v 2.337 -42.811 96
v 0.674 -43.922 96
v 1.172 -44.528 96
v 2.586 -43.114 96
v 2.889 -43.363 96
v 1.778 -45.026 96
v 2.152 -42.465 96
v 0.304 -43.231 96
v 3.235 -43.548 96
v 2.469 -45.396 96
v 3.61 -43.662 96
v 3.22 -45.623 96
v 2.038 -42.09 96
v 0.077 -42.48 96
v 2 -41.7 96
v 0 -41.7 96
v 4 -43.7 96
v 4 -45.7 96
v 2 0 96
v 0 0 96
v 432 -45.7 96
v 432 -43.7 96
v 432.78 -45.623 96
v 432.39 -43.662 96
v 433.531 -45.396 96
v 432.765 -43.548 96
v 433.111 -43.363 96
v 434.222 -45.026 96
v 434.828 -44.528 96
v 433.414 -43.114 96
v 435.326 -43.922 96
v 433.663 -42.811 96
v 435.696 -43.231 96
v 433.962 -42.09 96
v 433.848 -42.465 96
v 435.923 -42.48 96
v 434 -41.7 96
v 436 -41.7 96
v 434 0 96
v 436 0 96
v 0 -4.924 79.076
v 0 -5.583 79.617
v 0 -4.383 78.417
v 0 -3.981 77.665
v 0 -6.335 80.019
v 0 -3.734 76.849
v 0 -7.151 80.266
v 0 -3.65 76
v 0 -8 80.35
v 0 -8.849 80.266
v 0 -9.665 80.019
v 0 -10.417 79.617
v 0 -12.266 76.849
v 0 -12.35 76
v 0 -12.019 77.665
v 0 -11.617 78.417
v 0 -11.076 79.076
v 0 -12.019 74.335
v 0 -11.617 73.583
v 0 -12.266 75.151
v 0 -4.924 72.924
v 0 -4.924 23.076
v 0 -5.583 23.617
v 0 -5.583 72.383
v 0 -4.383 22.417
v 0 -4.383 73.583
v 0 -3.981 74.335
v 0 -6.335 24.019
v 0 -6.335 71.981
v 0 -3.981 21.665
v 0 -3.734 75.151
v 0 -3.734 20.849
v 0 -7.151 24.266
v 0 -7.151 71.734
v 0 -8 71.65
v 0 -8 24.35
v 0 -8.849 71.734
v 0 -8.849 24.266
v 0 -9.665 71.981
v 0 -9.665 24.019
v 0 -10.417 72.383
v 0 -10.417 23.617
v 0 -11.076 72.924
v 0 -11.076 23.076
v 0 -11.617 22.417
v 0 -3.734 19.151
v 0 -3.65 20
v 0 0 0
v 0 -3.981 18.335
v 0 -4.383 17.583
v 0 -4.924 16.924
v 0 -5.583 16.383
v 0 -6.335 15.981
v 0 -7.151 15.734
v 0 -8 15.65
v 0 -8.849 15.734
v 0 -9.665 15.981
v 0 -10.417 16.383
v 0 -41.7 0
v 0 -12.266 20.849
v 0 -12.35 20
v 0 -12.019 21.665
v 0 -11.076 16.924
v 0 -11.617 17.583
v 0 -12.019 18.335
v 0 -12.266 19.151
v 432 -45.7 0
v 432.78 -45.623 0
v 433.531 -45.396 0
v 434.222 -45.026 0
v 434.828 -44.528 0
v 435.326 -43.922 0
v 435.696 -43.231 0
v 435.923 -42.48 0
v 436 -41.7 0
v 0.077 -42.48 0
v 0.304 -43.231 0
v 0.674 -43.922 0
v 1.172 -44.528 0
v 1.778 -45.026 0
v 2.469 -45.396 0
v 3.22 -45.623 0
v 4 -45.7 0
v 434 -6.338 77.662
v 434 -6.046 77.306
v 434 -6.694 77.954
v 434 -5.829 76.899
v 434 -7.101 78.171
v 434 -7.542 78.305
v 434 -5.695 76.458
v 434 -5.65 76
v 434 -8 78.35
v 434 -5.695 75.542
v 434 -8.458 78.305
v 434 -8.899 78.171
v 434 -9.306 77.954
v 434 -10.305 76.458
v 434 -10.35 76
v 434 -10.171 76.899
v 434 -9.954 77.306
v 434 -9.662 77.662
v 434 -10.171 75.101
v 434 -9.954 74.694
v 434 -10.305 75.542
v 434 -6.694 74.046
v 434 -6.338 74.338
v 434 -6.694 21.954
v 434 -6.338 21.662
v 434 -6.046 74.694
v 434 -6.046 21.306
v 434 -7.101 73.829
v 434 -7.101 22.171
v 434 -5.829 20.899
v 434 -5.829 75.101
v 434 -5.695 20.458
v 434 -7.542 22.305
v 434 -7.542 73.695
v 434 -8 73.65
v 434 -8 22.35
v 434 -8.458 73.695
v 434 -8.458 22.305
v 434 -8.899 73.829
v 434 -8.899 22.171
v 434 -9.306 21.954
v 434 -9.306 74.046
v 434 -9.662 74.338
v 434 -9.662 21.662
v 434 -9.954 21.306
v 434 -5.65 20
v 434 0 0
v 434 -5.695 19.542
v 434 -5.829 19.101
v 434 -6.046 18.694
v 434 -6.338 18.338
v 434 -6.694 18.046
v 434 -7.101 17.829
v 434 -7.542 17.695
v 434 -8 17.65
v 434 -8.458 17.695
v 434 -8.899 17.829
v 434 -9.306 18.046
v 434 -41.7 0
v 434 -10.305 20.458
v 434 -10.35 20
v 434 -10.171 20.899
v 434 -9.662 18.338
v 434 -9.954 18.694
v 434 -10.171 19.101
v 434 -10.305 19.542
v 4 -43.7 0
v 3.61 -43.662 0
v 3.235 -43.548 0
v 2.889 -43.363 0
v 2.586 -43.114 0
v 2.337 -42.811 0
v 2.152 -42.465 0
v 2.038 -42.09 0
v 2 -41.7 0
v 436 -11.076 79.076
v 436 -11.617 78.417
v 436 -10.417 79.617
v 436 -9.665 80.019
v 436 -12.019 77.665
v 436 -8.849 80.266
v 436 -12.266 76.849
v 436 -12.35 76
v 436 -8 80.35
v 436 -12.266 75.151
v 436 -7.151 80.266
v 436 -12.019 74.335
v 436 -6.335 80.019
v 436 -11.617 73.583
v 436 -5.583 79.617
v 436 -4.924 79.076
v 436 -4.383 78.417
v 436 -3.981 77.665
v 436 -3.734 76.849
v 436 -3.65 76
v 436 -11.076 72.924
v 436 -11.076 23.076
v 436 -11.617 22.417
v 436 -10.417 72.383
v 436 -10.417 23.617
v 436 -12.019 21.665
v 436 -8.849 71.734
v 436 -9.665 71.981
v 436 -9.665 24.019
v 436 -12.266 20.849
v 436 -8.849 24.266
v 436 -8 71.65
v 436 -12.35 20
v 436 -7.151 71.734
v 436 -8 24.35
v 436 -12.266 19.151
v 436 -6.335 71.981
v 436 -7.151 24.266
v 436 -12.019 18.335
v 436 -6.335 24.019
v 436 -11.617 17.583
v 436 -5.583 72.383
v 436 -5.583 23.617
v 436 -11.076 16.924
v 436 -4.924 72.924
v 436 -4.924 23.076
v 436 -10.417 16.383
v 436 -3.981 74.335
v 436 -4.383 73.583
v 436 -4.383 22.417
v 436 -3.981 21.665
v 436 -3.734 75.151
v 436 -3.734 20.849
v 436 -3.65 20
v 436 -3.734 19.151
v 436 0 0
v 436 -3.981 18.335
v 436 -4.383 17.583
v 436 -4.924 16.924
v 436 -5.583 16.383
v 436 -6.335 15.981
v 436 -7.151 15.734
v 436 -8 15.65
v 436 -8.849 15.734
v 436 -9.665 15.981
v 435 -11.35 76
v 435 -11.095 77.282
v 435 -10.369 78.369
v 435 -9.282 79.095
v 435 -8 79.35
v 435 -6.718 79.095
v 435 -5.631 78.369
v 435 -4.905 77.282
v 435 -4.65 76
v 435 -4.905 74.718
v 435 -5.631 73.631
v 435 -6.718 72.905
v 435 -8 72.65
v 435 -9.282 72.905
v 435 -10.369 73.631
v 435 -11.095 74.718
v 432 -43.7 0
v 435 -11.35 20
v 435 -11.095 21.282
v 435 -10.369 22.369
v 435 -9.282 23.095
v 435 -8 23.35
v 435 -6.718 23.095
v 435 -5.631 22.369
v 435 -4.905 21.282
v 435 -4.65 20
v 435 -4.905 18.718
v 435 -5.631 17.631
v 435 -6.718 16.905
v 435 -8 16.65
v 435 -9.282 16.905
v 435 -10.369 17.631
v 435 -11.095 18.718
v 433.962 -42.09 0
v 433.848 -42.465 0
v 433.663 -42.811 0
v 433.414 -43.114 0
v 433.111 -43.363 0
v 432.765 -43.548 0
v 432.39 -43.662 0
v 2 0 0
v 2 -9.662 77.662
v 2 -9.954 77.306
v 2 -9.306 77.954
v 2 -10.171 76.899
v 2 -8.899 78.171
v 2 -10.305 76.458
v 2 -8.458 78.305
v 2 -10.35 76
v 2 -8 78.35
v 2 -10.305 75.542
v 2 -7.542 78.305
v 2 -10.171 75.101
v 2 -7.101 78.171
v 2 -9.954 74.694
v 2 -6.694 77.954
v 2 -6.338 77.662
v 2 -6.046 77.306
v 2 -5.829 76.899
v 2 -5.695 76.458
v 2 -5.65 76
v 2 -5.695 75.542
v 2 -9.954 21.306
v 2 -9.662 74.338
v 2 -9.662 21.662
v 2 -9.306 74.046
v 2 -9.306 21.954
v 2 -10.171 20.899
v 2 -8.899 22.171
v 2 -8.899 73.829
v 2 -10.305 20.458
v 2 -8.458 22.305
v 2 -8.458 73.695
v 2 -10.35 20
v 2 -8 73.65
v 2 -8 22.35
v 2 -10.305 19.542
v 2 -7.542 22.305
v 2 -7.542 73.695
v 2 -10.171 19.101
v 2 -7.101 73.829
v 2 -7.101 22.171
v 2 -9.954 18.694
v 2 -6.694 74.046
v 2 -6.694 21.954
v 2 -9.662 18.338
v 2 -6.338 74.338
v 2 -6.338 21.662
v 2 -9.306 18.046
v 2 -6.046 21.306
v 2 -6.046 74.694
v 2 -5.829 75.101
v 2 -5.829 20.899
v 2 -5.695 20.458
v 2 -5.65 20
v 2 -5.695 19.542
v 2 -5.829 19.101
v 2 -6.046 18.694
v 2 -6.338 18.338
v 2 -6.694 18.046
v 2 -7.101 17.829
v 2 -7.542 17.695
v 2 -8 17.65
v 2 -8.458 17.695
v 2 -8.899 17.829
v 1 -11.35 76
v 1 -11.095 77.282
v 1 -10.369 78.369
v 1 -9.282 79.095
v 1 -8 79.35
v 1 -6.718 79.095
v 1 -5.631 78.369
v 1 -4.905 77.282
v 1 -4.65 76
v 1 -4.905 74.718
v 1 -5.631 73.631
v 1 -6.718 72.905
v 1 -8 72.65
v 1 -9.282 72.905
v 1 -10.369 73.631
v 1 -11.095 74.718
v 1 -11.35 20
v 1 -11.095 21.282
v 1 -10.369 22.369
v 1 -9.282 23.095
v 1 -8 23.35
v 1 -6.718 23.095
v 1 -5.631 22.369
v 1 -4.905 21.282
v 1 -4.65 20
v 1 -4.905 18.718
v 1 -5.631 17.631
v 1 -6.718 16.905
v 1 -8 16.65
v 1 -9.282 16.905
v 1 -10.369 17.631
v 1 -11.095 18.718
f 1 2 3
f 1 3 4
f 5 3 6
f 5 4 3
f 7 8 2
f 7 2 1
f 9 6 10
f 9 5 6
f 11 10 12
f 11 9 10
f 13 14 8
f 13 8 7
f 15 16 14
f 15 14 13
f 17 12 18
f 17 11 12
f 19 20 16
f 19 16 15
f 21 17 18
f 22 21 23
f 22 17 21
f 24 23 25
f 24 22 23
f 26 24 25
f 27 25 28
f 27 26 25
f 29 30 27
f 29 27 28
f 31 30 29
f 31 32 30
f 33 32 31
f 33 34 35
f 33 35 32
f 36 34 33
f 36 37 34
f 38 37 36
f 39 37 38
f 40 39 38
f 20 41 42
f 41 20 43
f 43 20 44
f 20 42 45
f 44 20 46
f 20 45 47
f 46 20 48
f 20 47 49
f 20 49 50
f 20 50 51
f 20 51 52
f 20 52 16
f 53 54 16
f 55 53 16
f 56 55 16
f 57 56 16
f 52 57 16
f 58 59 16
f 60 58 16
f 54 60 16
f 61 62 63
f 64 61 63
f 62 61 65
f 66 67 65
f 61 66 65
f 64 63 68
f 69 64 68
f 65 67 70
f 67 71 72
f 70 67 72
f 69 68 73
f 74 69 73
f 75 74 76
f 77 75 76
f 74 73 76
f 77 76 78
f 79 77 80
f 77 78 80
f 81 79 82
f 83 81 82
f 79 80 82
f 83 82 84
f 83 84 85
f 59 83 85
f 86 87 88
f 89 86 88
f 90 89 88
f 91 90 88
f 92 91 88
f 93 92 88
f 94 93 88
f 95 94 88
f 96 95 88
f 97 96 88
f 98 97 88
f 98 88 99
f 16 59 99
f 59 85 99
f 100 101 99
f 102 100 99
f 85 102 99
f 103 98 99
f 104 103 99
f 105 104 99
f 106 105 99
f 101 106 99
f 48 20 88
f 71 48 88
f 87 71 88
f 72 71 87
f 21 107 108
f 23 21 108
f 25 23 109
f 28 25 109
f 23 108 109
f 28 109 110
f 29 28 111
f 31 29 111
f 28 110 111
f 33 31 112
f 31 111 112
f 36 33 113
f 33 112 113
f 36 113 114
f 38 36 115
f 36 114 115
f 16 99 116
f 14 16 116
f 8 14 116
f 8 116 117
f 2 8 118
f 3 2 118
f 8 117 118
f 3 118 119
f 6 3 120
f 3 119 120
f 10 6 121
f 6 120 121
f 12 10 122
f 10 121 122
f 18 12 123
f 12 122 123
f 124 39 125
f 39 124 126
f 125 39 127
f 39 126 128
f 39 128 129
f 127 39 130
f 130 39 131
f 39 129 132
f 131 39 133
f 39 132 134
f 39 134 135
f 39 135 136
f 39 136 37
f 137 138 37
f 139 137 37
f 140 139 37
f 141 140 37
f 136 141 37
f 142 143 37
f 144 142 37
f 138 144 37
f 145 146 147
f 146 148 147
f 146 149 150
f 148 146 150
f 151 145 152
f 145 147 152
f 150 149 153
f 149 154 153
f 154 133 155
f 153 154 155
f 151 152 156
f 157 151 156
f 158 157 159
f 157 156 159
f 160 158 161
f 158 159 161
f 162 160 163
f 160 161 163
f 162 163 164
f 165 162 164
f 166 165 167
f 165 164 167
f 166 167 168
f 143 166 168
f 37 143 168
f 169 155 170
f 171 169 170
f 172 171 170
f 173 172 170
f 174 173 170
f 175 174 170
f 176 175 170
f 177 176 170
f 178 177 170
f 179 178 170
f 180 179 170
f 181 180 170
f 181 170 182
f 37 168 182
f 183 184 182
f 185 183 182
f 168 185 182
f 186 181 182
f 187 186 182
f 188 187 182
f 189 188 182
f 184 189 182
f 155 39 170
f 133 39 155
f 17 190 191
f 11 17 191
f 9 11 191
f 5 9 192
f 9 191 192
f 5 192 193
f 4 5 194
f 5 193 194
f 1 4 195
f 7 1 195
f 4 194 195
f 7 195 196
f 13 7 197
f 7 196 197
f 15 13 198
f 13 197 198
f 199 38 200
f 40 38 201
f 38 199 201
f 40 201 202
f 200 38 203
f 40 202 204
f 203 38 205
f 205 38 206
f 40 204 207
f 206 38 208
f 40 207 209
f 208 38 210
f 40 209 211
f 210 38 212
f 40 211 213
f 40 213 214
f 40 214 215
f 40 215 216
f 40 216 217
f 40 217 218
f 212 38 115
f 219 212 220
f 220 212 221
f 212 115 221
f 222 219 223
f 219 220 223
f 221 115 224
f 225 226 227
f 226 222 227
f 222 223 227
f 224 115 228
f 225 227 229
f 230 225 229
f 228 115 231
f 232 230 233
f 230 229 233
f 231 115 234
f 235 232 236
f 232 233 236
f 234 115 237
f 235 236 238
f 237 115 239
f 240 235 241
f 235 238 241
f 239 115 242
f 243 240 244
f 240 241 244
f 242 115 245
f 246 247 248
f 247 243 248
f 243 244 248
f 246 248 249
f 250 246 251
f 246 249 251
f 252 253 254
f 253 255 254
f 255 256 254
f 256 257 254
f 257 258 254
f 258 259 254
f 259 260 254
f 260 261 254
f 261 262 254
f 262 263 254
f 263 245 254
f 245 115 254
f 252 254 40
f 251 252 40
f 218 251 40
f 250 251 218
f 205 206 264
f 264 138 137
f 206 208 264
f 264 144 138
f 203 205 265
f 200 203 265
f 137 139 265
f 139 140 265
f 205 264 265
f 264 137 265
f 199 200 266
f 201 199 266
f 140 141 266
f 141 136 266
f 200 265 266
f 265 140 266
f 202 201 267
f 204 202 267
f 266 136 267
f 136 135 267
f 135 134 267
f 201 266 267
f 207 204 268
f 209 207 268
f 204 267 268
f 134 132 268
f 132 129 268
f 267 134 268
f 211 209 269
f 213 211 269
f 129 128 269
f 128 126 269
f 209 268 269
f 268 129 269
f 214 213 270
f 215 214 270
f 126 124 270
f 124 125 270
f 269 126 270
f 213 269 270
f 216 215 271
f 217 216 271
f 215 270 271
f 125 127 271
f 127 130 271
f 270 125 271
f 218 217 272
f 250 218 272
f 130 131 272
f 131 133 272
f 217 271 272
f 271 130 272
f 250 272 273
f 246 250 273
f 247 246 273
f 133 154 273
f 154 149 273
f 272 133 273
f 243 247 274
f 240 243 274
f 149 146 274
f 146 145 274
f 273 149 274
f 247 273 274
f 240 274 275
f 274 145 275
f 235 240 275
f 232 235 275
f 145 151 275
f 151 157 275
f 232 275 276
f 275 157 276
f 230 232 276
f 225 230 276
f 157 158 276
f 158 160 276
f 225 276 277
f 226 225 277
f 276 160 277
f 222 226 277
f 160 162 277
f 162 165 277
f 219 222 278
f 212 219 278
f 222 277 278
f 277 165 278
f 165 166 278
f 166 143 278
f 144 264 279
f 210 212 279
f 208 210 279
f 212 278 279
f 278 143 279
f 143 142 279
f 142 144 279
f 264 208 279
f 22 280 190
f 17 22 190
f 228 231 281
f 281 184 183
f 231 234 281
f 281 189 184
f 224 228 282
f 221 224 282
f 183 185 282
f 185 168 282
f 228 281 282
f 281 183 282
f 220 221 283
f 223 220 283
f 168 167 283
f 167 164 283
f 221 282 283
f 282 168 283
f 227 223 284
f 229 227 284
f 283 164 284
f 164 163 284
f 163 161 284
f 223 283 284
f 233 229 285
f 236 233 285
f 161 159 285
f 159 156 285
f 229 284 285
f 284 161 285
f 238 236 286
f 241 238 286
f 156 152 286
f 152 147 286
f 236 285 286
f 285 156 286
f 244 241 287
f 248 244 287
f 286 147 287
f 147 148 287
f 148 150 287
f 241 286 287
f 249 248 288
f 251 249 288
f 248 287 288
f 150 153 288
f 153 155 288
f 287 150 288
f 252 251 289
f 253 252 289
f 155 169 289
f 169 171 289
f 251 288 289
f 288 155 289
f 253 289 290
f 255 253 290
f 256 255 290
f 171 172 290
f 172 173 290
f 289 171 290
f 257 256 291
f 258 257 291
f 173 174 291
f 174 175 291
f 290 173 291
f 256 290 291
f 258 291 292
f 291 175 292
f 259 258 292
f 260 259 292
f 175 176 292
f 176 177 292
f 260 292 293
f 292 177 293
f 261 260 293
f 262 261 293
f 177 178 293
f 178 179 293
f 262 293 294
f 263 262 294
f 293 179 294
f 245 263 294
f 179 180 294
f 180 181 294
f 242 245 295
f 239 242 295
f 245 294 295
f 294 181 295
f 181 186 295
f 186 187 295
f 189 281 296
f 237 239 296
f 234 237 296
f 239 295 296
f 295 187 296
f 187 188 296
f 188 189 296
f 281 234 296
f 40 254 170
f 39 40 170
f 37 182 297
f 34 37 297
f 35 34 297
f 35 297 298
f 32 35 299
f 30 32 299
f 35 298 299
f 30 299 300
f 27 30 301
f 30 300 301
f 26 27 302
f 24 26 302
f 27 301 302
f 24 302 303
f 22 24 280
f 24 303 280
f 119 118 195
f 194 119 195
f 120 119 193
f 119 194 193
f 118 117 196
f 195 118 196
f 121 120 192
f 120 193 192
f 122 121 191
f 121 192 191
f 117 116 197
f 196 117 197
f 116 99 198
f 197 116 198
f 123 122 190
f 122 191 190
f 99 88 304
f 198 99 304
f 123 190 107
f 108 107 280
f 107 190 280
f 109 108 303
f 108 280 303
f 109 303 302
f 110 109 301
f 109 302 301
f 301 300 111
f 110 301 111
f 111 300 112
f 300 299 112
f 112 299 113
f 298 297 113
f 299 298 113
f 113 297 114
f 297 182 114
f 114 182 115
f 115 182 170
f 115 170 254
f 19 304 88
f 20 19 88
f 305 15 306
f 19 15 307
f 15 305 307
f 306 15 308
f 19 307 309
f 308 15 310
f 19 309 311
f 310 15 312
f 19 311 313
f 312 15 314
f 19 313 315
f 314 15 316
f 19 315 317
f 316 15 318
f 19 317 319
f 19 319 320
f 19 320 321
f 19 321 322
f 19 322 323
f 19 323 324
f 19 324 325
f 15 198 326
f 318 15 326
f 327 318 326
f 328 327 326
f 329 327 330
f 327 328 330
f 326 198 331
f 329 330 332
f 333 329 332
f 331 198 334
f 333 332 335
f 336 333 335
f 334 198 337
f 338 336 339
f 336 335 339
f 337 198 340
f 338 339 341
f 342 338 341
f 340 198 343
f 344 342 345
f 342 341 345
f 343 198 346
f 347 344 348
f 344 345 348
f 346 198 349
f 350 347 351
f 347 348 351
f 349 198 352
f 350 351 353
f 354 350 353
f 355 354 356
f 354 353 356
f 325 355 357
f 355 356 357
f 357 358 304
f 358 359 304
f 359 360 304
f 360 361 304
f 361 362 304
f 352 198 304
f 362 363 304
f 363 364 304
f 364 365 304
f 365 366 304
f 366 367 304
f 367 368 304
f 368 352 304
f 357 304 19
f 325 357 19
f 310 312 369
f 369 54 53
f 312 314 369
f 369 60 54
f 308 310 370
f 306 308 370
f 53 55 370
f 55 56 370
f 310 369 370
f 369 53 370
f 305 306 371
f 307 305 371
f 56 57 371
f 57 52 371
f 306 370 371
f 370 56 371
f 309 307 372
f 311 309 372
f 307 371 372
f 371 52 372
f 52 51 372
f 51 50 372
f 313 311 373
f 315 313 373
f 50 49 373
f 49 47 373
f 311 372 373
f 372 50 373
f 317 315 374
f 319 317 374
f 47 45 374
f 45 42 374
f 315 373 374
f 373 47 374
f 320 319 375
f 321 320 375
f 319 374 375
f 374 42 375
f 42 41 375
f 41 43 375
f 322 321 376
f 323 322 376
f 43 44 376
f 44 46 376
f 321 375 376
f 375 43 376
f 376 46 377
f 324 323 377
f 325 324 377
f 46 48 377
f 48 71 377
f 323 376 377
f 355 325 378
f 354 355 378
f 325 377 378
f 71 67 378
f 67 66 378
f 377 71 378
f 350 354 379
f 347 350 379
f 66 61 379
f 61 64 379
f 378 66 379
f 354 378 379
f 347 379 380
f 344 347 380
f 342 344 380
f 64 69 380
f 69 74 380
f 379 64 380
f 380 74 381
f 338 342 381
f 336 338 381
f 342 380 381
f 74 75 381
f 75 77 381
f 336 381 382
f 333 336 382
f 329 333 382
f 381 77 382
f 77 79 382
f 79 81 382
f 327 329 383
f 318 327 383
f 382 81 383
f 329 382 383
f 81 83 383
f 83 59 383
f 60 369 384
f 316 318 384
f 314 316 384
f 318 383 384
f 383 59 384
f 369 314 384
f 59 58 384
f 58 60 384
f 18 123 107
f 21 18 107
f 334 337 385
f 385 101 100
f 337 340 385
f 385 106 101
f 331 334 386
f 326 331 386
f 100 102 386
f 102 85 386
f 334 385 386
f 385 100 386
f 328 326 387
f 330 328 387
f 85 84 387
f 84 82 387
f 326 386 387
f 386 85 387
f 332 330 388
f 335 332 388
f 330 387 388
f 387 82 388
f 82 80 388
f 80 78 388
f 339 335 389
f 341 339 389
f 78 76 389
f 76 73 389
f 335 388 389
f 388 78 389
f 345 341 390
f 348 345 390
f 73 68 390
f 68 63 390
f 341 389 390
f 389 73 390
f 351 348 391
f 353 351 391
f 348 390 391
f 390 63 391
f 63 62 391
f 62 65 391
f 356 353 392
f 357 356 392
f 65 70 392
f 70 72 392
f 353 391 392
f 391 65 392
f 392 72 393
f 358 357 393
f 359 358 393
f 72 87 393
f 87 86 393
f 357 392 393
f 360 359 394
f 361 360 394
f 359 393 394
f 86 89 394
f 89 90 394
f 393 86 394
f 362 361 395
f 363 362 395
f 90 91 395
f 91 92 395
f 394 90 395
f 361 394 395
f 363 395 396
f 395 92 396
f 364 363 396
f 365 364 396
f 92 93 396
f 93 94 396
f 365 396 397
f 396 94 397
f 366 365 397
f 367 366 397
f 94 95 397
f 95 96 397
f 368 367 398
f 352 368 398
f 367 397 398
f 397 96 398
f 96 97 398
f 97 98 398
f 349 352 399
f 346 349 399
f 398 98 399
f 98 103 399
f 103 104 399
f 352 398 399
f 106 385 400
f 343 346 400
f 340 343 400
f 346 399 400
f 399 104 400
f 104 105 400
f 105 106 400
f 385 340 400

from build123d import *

# Parameters (mm, degrees)
SM_BASE_FLANGE_1_DEPTH = 96
SKETCH_2_R             = 2.3
CUT_EXTRUDE_1_DEPTH    = 449.776659375
CHAMFER_1_SIZE         = 2.05


# Sheet-metal steps are written as plain solids
with BuildPart() as part:
    # Sketch 1 → Базовая кромка1 (new body)
    with BuildSketch(Plane.XY):
        with BuildLine():
            Line((0, 0), (0, -41.7))
            ThreePointArc((0, -41.7), (1.171572875, -44.528427125), (4, -45.7))
            Line((4, -45.7), (432, -45.7))
            ThreePointArc((432, -45.7), (434.828427125, -44.528427125), (436, -41.7))
            Line((436, -41.7), (436, 0))
            Line((436, 0), (434, 0))
            Line((434, 0), (434, -41.7))
            ThreePointArc((434, -41.7), (433.414213562, -43.114213562), (432, -43.7))
            Line((432, -43.7), (4, -43.7))
            ThreePointArc((4, -43.7), (2.585786438, -43.114213562), (2, -41.7))
            Line((2, -41.7), (2, 0))
            Line((2, 0), (0, 0))
        make_face()
    extrude(amount=SM_BASE_FLANGE_1_DEPTH)

    # Sketch 2 → Вырез-Вытянуть1 (cut, through all)
    with BuildSketch(Plane.ZY):
        with Locations(Location((20, -8, 0), (0, 0, 270))):
            Circle(SKETCH_2_R)
        with Locations(Location((76, -8, 0), (0, 0, 270))):
            Circle(SKETCH_2_R)
    extrude(amount=-CUT_EXTRUDE_1_DEPTH, mode=Mode.SUBTRACT)

    # Фаска1
    # the kernel refuses this chamfer: 2.05 mm, written as the material it takes off along each edge
    with BuildSketch(Plane(origin=(436, -8, 20), x_dir=(0, -1, 0), z_dir=(0, 0, -1))) as chamfer_1_piece_1:
        Polygon((2.3 + CHAMFER_1_SIZE, 0), (2.3, CHAMFER_1_SIZE), (2.3, 0), align=None)
    revolve(axis=Axis((436, -8, 20), (-1, 0, 0)), mode=Mode.SUBTRACT)
    with BuildSketch(Plane(origin=(436, -8, 76), x_dir=(0, -1, 0), z_dir=(0, 0, -1))) as chamfer_1_piece_2:
        Polygon((2.3 + CHAMFER_1_SIZE, 0), (2.3, CHAMFER_1_SIZE), (2.3, 0), align=None)
    revolve(axis=Axis((436, -8, 76), (-1, 0, 0)), mode=Mode.SUBTRACT)
    with BuildSketch(Plane(origin=(0, -8, 76), x_dir=(0, -1, 0), z_dir=(0, 0, -1))) as chamfer_1_piece_3:
        Polygon((2.3, -CHAMFER_1_SIZE), (2.3 + CHAMFER_1_SIZE, 0), (2.3, 0), align=None)
    revolve(axis=Axis((0, -8, 76), (-1, 0, 0)), mode=Mode.SUBTRACT)
    with BuildSketch(Plane(origin=(0, -8, 20), x_dir=(0, -1, 0), z_dir=(0, 0, -1))) as chamfer_1_piece_4:
        Polygon((2.3, -CHAMFER_1_SIZE), (2.3 + CHAMFER_1_SIZE, 0), (2.3, 0), align=None)
    revolve(axis=Axis((0, -8, 20), (-1, 0, 0)), mode=Mode.SUBTRACT)


solid = part.part
